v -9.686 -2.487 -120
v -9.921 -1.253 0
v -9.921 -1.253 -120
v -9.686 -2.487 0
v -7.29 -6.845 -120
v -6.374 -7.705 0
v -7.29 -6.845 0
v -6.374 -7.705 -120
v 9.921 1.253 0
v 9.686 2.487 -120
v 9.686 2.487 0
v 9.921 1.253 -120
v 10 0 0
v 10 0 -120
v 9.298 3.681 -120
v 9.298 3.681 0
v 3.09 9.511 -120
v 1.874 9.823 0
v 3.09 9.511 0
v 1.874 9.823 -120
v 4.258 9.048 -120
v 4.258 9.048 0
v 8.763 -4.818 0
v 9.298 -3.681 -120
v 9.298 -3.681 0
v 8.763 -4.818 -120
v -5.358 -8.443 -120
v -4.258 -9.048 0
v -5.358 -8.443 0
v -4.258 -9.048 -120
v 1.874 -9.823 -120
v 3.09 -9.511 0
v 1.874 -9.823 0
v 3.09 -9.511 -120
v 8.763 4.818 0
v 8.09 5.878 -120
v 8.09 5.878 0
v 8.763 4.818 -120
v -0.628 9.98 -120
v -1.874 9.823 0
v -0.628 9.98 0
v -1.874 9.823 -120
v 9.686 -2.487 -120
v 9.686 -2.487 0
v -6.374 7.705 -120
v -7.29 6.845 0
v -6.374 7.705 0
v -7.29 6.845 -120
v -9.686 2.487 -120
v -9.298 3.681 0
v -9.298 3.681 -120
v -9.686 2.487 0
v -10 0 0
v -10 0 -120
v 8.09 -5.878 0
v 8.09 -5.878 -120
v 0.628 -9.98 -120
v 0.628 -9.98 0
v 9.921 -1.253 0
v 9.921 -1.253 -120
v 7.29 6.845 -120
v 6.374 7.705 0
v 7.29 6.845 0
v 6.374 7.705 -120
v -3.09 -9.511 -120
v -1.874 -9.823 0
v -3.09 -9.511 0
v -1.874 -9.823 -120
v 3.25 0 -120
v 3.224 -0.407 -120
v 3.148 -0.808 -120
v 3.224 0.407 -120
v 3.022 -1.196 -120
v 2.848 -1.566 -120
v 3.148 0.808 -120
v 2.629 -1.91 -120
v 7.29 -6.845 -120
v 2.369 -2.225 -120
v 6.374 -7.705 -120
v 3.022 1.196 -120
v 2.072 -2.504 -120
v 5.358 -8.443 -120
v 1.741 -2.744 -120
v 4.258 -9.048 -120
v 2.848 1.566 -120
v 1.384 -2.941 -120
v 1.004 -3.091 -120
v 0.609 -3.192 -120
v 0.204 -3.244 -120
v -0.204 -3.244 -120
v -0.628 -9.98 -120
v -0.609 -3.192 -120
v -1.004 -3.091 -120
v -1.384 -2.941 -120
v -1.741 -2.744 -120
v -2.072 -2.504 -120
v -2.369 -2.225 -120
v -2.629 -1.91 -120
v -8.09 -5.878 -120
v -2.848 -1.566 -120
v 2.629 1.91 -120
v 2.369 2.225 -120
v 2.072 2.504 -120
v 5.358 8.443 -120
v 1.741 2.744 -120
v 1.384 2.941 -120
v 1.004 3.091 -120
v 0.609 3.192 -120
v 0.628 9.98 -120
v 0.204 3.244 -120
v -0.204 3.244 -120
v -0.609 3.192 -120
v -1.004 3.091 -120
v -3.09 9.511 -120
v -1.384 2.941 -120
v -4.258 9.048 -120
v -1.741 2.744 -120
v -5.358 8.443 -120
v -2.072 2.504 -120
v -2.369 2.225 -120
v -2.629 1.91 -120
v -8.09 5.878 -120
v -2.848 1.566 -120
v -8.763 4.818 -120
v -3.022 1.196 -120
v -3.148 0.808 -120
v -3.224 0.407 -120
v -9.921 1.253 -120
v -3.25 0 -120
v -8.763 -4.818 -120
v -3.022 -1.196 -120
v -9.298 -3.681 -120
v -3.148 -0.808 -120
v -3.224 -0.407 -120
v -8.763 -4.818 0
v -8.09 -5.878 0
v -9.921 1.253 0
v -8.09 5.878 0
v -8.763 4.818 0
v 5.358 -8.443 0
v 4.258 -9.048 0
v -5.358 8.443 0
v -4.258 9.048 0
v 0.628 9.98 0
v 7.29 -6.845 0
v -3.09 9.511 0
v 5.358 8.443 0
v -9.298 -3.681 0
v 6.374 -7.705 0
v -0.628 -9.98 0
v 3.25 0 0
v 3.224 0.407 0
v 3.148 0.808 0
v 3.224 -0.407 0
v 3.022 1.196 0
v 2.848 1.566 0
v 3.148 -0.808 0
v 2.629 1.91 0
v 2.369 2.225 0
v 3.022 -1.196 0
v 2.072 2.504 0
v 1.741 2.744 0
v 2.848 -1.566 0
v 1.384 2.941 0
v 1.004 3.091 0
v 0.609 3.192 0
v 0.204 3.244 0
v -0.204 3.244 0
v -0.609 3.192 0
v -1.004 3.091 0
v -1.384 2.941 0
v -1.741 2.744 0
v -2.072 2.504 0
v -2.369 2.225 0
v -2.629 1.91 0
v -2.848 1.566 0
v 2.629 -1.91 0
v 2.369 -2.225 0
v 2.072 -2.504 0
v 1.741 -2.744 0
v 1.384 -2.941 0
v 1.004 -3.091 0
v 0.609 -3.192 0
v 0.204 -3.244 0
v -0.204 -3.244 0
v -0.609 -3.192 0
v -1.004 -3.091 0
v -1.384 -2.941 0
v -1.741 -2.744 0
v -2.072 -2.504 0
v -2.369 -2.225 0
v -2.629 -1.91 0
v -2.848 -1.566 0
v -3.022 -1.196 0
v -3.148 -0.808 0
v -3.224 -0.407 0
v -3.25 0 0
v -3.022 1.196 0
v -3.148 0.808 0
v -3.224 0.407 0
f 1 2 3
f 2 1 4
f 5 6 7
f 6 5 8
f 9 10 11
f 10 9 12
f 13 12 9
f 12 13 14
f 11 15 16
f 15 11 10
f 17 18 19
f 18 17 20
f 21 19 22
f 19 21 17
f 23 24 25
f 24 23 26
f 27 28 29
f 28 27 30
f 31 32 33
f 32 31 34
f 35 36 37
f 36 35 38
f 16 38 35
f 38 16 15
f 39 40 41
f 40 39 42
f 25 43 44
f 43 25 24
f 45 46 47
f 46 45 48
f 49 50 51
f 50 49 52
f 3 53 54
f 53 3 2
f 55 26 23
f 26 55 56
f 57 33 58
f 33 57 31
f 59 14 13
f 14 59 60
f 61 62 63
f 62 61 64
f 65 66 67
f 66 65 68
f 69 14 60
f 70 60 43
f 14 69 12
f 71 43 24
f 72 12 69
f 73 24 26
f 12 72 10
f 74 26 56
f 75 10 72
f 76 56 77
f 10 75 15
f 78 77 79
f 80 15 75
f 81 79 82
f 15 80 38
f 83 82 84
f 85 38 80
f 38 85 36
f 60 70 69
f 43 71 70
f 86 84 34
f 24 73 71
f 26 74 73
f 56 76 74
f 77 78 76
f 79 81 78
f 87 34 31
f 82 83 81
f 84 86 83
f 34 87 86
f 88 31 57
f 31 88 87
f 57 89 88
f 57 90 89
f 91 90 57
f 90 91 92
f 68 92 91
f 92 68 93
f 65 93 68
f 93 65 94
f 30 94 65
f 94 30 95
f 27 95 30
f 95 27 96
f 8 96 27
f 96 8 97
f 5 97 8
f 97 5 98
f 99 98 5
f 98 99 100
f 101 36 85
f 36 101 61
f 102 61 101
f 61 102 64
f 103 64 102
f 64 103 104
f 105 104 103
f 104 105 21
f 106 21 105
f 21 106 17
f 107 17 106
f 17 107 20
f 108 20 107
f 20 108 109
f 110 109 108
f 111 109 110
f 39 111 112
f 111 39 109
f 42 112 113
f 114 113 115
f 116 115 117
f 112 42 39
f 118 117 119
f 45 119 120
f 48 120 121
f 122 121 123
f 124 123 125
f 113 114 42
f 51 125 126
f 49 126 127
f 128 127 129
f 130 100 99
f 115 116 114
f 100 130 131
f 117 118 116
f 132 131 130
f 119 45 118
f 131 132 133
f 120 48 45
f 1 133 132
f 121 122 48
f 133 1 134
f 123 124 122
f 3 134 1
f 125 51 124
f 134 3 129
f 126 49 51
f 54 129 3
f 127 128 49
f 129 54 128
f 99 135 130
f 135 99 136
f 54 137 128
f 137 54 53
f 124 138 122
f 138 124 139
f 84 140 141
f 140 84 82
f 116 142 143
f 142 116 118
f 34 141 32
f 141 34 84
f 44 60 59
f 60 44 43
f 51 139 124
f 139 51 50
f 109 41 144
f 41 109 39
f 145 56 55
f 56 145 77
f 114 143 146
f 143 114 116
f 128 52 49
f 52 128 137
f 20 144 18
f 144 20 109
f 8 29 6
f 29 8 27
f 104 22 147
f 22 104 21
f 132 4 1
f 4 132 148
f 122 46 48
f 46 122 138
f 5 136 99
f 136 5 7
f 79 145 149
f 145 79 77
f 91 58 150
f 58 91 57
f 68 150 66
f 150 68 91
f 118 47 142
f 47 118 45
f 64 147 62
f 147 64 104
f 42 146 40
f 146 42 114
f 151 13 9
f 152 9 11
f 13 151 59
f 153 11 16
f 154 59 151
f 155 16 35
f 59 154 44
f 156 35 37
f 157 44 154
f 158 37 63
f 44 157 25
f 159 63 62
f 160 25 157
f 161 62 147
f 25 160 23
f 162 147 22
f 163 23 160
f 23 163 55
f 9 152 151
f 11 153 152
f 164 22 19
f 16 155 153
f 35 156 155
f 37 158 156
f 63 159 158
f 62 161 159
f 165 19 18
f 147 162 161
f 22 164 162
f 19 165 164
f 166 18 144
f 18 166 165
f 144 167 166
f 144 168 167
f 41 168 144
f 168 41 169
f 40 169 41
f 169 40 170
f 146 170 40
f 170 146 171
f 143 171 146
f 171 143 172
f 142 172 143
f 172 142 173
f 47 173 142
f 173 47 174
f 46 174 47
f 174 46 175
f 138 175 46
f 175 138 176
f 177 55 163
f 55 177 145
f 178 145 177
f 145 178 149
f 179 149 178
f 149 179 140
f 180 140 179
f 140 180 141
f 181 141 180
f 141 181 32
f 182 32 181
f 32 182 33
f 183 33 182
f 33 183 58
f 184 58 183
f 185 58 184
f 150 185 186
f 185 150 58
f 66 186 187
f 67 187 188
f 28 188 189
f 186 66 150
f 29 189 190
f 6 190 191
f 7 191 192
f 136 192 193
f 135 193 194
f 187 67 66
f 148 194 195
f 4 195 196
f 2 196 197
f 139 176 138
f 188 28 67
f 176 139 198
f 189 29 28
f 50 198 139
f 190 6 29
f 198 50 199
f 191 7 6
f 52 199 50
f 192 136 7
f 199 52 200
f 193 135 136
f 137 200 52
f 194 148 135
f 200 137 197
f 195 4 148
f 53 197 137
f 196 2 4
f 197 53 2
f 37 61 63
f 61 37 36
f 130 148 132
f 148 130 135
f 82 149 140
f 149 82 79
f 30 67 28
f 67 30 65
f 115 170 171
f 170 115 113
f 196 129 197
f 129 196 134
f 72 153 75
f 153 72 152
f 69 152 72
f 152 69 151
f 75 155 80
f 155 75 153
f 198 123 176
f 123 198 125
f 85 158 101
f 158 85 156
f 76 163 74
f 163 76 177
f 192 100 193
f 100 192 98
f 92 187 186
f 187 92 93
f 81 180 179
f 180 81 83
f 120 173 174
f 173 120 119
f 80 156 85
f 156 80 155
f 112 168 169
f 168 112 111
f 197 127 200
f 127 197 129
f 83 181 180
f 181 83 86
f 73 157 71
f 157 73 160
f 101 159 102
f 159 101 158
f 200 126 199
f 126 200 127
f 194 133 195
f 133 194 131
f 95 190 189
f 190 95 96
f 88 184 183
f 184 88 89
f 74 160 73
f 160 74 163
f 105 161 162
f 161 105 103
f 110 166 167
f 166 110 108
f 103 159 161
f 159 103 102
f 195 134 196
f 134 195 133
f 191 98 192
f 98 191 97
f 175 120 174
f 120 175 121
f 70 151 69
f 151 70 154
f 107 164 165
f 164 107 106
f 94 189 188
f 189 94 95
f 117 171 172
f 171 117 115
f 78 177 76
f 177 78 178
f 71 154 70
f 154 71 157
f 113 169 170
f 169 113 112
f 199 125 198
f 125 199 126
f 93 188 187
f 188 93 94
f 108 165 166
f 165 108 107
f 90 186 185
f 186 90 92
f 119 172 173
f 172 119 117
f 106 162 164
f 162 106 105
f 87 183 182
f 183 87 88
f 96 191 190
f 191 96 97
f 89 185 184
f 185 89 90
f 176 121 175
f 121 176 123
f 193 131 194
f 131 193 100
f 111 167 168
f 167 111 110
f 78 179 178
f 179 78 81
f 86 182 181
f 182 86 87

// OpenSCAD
$fn = 50;


difference() {
	union() {
		translate(v = [0, 0, -120.0000000000]) {
			cylinder(h = 120, r = 10.0000000000);
		}
		cylinder(h = 0, r = 13.0000000000);
	}
	union() {
		#translate(v = [0, 0, -120]) {
			cylinder(h = 120, r = 3.2500000000);
		}
	}
}
